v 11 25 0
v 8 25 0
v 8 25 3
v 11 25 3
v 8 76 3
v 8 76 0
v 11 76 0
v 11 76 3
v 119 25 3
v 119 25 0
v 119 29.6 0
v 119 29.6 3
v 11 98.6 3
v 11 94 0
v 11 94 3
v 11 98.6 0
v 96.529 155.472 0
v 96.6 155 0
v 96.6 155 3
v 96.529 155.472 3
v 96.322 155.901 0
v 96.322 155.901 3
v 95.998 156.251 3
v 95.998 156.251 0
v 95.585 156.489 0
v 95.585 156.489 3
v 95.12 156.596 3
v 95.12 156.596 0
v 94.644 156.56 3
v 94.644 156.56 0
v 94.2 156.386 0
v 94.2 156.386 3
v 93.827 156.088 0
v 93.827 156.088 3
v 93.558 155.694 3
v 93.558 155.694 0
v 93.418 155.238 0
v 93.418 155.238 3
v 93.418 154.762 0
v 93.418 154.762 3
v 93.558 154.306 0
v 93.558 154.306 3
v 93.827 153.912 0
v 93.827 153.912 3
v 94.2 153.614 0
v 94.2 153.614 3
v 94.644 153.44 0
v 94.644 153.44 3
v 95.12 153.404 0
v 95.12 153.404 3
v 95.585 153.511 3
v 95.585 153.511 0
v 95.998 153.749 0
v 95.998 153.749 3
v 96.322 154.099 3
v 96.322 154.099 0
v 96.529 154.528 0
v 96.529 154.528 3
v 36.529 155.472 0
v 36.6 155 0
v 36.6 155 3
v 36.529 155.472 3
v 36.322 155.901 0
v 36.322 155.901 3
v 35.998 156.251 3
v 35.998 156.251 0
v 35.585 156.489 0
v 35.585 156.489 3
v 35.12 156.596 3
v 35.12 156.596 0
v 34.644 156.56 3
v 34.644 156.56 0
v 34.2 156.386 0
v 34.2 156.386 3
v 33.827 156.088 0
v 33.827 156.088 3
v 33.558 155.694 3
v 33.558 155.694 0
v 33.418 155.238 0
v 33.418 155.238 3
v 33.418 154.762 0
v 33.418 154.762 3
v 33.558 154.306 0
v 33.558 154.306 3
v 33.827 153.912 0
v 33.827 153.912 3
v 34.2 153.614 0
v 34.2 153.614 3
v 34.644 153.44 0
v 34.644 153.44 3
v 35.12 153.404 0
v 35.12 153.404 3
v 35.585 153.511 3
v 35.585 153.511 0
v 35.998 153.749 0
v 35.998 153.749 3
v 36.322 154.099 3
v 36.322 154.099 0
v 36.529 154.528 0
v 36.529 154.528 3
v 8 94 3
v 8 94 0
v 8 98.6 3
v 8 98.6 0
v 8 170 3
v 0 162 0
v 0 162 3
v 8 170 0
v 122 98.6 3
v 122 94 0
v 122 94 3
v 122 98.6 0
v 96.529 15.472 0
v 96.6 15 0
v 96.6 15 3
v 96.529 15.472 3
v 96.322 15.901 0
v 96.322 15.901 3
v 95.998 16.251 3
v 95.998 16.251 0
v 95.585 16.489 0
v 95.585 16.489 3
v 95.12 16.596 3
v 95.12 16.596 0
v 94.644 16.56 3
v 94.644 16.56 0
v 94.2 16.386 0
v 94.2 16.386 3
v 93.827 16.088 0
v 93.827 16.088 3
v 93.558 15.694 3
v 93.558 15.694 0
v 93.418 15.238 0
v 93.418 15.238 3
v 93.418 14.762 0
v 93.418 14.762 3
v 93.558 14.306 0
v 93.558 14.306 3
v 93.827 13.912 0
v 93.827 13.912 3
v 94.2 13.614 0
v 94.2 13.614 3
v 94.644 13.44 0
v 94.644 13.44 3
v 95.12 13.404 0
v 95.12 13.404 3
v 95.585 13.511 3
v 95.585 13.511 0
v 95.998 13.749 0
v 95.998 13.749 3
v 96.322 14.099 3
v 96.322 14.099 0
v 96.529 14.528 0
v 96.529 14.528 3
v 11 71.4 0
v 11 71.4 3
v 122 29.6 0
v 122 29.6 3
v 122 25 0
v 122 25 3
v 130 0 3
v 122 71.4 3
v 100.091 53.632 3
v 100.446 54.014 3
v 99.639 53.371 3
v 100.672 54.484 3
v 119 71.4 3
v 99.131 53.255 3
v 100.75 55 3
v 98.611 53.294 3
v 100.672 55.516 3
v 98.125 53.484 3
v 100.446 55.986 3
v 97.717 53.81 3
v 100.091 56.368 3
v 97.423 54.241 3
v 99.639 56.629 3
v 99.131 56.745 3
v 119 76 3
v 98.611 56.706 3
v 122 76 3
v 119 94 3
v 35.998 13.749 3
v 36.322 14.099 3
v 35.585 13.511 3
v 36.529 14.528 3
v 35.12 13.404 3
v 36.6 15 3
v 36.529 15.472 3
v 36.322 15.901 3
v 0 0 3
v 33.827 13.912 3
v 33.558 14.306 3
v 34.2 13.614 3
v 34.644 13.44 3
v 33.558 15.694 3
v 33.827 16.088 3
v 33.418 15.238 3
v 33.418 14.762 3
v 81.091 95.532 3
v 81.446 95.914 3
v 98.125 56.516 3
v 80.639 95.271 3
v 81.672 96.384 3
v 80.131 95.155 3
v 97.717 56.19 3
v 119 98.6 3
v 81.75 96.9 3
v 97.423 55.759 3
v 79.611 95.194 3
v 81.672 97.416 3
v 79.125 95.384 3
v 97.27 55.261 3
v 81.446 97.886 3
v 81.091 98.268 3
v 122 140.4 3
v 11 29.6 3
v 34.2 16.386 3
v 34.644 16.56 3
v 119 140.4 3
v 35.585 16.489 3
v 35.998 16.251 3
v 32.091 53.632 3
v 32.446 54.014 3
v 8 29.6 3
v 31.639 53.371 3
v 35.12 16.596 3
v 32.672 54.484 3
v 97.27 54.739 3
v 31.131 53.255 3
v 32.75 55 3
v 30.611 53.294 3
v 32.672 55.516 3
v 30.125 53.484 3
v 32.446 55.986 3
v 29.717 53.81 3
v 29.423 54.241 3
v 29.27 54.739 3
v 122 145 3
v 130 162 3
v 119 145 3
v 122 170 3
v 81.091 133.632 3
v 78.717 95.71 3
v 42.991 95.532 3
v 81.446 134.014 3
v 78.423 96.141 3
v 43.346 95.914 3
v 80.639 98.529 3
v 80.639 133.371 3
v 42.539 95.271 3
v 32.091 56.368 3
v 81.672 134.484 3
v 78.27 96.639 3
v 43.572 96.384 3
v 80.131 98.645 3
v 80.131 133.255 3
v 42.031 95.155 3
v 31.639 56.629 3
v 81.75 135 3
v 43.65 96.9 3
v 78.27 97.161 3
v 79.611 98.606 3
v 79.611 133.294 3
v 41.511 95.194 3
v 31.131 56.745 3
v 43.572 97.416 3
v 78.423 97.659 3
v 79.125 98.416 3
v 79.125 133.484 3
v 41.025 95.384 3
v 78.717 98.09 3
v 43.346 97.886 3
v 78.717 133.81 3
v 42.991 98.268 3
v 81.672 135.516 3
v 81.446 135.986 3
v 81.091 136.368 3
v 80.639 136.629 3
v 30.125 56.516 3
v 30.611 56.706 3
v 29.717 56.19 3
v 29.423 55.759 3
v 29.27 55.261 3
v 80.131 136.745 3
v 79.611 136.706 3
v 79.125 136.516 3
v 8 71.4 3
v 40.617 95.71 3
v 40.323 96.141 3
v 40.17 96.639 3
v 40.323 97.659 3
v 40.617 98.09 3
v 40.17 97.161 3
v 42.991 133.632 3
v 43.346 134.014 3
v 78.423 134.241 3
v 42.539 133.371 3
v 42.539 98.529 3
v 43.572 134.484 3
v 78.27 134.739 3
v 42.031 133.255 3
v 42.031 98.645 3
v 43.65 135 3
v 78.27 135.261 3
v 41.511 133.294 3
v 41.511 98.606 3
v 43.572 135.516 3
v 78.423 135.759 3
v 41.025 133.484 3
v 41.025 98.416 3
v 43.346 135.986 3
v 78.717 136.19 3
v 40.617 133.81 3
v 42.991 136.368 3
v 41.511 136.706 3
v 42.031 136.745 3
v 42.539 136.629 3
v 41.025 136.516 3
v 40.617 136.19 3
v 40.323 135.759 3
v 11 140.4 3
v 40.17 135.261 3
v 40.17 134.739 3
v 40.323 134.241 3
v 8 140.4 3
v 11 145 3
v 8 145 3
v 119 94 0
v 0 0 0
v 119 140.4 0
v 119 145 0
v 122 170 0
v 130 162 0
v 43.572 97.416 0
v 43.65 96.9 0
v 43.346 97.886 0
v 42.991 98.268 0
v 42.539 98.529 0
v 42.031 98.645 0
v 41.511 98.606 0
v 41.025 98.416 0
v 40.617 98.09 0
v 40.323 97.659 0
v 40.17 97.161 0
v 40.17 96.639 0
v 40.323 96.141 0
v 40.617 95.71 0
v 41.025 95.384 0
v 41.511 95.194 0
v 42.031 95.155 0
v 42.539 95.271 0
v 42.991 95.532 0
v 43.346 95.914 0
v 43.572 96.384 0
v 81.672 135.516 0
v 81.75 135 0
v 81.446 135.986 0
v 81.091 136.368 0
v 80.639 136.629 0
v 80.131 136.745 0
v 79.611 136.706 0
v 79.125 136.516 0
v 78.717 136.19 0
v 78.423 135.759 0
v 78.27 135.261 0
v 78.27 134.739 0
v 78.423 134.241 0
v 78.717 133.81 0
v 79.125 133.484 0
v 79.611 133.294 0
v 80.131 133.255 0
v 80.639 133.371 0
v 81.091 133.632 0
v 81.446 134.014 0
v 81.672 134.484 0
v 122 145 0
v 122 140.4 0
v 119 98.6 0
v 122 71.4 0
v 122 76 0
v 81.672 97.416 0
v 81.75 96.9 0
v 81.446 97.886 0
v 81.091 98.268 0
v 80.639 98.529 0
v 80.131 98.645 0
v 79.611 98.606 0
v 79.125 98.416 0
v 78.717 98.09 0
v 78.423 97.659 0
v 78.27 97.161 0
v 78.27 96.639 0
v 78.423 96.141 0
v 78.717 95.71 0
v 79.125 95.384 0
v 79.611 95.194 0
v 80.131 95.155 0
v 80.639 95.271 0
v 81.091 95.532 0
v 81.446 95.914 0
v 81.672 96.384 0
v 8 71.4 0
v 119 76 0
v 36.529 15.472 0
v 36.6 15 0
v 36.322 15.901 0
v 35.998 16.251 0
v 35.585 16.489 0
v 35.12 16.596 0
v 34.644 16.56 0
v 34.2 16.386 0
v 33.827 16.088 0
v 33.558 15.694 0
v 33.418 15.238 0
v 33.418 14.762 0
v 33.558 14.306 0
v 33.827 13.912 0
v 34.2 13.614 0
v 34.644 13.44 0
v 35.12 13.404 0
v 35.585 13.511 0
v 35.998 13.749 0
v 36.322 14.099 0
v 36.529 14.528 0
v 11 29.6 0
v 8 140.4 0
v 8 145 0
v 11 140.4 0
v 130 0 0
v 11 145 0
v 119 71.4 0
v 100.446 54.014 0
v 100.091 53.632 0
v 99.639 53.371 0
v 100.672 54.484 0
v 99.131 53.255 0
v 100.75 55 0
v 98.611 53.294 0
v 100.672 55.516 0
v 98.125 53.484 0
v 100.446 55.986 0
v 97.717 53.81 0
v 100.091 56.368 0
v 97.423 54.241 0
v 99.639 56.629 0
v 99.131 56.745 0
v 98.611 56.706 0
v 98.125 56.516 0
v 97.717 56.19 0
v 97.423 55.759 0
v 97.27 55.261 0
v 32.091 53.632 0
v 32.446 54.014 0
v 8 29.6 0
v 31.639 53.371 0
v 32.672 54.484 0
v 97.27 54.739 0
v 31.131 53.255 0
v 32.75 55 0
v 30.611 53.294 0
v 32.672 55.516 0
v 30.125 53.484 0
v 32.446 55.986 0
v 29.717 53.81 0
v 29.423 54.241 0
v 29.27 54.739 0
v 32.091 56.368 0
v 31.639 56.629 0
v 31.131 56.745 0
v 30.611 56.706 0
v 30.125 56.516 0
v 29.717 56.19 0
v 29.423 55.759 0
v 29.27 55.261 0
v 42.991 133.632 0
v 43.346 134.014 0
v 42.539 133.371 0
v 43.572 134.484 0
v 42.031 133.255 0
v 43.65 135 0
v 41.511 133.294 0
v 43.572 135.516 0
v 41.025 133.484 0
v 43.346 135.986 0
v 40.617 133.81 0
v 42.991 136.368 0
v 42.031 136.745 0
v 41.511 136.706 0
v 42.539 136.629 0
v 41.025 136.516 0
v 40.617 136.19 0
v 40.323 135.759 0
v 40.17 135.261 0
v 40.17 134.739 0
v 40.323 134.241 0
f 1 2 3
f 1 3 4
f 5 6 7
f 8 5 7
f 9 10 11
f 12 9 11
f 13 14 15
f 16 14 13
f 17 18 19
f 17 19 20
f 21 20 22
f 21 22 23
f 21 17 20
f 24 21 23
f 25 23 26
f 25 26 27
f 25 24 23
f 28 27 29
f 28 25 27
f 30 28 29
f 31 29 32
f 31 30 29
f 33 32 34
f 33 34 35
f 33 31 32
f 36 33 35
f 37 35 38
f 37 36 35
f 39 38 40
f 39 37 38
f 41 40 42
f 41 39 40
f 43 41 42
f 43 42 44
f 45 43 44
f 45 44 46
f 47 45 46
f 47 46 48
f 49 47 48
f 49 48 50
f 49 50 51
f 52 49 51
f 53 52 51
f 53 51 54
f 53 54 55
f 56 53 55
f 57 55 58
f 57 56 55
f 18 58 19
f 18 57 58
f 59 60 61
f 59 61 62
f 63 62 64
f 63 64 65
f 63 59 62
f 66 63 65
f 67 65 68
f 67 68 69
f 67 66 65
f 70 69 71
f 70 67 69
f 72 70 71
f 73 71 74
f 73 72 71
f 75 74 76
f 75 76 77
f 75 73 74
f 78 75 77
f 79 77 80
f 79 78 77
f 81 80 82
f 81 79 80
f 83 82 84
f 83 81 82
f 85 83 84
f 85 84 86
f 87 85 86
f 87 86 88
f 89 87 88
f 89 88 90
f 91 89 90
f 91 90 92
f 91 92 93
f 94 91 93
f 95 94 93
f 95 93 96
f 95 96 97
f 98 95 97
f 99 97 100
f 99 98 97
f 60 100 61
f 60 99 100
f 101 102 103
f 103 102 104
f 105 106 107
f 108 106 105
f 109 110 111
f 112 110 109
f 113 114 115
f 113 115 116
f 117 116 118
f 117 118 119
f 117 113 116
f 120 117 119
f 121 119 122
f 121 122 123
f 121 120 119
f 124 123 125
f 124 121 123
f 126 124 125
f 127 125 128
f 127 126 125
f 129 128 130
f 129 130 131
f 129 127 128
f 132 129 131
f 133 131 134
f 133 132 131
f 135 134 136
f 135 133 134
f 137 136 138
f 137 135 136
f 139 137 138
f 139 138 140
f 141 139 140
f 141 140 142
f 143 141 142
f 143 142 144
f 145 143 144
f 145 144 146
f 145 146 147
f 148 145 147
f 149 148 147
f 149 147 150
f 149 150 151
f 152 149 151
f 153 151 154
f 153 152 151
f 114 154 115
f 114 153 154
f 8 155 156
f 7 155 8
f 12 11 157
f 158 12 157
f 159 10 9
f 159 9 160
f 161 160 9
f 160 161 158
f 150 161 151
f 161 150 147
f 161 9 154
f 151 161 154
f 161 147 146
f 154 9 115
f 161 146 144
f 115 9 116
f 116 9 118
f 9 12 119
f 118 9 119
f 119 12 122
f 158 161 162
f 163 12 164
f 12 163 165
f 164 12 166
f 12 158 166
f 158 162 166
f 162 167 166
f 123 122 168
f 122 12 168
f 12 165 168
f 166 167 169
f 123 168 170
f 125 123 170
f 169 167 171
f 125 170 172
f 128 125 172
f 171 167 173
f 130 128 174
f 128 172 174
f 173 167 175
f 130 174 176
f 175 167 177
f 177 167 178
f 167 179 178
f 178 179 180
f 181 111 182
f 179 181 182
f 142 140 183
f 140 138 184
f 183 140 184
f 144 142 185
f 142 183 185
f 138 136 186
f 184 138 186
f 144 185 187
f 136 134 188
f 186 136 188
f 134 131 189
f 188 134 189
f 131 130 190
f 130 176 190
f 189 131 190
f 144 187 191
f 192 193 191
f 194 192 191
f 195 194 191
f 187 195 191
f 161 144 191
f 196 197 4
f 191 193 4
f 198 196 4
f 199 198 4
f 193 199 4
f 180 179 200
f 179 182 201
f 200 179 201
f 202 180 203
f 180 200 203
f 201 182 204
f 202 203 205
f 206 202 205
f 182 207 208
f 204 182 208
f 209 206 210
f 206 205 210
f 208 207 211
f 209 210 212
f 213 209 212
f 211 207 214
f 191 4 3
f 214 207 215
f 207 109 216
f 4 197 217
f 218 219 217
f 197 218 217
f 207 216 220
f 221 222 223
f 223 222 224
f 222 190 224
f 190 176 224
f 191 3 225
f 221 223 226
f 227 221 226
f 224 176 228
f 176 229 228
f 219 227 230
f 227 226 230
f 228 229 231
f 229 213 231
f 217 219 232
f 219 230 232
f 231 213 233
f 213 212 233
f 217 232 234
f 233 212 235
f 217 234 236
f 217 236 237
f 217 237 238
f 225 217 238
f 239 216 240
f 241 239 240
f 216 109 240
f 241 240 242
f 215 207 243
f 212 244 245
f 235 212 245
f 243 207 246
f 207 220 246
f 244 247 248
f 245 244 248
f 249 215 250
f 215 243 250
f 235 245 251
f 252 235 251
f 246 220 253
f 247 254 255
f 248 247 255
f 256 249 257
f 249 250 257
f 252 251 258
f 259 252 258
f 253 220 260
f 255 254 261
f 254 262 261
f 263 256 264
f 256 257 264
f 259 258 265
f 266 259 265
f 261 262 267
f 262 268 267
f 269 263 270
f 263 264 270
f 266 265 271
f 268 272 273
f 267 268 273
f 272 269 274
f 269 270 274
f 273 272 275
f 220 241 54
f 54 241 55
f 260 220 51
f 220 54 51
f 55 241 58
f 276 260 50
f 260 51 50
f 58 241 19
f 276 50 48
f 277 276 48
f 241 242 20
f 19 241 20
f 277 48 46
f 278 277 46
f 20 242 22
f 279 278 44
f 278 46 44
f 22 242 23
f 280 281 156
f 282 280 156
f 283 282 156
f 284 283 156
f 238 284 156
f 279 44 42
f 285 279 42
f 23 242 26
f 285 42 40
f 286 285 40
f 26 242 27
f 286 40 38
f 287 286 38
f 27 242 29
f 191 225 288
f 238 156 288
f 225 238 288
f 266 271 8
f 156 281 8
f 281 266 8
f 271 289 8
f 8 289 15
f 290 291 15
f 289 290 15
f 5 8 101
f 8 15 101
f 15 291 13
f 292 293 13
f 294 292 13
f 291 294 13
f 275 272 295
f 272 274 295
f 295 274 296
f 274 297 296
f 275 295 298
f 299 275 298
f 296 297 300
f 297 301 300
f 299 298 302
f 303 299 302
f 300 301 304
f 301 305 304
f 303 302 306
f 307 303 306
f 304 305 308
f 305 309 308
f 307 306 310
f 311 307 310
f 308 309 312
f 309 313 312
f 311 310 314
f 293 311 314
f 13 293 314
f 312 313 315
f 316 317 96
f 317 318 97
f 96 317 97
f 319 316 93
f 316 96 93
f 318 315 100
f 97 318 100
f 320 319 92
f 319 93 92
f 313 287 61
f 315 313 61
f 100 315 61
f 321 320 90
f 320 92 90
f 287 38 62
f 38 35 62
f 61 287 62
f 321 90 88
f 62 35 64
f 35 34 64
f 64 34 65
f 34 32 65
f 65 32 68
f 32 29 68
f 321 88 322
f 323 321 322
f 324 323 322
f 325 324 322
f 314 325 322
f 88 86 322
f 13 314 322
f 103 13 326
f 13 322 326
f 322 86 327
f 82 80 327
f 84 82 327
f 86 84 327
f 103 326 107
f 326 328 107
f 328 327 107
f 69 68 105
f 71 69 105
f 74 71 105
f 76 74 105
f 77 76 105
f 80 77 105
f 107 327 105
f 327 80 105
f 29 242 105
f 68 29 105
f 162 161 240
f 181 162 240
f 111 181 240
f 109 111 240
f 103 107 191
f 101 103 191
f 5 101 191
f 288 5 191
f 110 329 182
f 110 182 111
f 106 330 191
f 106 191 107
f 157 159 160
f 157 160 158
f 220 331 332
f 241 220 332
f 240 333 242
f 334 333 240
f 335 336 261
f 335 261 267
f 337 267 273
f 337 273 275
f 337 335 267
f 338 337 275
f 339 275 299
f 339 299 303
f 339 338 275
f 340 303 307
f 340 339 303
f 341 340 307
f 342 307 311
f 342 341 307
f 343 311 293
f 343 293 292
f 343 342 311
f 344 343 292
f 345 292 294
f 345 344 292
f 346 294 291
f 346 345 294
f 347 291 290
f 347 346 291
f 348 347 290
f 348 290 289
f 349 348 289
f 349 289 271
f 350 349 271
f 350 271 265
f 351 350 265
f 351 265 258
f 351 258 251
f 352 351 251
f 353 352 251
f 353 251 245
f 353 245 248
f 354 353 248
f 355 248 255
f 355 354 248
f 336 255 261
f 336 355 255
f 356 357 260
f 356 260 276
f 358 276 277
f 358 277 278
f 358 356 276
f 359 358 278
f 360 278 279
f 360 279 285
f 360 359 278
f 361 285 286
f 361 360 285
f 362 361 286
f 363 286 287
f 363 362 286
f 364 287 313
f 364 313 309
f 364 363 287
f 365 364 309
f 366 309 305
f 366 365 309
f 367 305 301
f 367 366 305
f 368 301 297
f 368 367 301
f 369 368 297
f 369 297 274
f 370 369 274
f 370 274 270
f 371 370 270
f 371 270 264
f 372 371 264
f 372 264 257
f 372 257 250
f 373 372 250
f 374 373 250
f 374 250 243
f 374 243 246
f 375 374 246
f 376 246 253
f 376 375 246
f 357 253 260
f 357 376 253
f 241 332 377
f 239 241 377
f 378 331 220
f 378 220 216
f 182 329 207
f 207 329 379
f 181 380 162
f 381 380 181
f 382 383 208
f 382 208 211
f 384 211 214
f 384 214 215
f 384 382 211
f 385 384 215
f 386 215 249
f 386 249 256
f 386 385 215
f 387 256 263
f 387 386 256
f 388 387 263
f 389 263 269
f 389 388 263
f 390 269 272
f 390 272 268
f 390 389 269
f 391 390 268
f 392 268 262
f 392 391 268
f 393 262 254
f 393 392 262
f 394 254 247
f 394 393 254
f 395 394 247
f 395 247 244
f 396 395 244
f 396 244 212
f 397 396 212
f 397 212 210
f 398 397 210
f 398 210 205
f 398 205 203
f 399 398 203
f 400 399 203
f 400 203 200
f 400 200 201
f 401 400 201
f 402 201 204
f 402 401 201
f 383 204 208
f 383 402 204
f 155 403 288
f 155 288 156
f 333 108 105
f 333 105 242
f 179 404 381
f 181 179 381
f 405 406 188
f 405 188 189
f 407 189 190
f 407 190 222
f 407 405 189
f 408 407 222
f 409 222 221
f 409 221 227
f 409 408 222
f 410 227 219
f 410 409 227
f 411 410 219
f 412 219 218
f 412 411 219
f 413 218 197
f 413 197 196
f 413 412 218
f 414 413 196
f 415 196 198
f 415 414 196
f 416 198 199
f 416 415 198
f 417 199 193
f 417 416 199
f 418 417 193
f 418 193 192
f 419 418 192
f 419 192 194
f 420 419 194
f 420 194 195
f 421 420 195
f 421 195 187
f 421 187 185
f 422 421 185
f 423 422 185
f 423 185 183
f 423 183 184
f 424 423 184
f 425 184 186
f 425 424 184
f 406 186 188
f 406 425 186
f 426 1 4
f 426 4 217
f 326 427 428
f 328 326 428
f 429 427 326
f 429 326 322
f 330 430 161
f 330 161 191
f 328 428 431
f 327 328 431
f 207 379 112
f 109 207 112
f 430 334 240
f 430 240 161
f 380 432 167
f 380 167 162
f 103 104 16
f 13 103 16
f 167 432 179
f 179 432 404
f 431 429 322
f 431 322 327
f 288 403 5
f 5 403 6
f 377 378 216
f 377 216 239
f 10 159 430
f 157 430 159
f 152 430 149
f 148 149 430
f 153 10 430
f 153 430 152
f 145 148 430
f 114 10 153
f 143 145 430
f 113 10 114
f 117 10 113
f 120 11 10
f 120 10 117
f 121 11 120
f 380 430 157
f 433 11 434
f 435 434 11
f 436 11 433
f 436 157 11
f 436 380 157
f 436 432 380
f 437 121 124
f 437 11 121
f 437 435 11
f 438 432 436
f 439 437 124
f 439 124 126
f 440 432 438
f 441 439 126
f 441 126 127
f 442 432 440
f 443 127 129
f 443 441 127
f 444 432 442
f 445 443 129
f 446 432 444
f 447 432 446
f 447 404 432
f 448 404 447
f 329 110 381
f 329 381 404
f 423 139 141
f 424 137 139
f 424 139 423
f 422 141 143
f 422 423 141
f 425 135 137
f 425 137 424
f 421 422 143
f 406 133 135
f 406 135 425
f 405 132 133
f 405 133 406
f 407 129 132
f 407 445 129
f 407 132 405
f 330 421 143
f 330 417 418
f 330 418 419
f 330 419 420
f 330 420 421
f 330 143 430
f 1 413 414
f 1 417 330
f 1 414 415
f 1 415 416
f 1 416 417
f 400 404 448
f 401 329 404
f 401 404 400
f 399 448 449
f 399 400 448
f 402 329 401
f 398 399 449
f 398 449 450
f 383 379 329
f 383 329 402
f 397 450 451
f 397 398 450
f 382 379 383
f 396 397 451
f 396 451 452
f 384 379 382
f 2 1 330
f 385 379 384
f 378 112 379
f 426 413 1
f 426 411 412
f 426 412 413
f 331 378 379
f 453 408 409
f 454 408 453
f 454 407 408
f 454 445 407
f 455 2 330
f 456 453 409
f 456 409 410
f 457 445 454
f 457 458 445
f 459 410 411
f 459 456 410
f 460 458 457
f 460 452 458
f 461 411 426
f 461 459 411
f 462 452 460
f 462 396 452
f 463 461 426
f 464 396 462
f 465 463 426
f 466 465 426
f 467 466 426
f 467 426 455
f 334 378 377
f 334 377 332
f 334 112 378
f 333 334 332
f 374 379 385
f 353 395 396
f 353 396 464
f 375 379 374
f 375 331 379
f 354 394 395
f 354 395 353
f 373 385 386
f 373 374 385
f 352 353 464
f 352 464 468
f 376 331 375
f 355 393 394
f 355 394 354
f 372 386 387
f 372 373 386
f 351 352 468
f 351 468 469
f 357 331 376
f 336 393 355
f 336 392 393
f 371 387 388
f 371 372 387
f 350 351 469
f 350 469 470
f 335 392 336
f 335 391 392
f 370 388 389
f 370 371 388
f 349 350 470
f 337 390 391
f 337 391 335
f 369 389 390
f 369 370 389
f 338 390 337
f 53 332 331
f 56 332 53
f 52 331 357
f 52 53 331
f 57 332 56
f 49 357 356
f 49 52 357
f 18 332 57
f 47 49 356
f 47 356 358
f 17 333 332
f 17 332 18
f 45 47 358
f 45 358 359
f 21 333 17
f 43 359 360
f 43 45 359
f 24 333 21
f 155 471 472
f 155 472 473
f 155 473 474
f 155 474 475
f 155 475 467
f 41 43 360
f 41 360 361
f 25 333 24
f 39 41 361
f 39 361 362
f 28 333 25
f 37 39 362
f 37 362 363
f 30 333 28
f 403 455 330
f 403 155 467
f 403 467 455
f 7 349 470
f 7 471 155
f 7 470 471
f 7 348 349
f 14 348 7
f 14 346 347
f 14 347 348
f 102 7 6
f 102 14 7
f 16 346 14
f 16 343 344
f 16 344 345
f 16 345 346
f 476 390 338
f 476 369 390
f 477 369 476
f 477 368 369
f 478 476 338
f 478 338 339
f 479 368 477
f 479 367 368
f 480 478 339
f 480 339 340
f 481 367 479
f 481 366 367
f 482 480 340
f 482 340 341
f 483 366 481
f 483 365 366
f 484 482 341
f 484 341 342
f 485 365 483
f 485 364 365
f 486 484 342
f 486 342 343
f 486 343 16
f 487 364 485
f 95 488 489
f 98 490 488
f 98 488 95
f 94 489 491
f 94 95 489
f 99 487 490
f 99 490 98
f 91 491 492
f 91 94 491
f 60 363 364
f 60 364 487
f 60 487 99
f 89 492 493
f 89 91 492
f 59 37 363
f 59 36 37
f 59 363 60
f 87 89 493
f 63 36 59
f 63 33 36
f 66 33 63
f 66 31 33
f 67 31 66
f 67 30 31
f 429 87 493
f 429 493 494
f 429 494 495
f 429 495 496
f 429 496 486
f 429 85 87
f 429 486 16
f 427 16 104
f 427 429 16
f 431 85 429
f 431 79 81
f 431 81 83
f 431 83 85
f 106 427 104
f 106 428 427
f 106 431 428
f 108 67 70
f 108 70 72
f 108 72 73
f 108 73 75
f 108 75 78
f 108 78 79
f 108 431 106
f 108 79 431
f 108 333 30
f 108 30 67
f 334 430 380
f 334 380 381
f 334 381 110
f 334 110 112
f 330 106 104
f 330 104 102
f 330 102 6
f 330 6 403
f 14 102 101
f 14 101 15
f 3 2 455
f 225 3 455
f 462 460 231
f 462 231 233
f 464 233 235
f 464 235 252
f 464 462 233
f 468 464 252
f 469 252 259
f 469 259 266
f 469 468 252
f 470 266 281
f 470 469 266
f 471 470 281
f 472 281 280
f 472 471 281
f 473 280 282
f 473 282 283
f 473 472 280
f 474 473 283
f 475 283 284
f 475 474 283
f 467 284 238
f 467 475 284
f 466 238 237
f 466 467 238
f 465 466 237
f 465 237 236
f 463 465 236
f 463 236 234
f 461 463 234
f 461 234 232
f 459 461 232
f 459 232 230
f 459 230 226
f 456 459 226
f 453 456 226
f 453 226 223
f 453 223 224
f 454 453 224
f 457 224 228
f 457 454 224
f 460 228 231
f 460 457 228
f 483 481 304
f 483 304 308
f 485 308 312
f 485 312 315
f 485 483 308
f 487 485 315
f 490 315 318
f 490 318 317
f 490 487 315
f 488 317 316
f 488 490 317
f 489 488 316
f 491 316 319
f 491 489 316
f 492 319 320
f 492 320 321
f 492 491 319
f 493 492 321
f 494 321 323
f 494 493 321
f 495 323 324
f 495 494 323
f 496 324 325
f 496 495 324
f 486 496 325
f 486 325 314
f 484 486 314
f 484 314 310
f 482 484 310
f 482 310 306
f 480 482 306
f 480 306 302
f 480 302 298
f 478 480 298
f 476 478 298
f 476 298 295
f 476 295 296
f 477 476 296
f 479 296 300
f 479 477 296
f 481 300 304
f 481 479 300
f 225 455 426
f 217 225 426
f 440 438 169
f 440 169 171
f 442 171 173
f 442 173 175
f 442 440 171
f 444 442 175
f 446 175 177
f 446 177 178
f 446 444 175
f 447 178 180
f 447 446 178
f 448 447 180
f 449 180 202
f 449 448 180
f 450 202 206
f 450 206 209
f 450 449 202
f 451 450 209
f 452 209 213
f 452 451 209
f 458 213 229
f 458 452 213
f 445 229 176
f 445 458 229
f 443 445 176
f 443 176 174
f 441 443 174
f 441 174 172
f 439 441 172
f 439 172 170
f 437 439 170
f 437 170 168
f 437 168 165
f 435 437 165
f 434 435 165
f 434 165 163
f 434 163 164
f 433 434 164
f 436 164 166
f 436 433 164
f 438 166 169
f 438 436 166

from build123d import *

# Parameters (mm, degrees)
SKETCH_1_R      = 1.6
SKETCH_1_R_2    = 1.75
SKETCH_1_W      = 3
SKETCH_1_H      = 4.6
EXTRUDE_1_DEPTH = 3


with BuildPart() as part:
    # ｽｹｯﾁ1 → ﾎﾞｽ - 押し出し1 (new body)
    with BuildSketch(Plane.XY):
        Polygon((0, 162), (8, 170), (122, 170), (130, 162), (130, 0), (0, 0), align=None)
        with Locations((35, 155)):
            Circle(SKETCH_1_R, mode=Mode.SUBTRACT)
        with Locations((95, 155)):
            Circle(SKETCH_1_R, mode=Mode.SUBTRACT)
        with Locations((35, 15)):
            Circle(SKETCH_1_R, mode=Mode.SUBTRACT)
        with Locations((95, 15)):
            Circle(SKETCH_1_R, mode=Mode.SUBTRACT)
        with Locations((41.9, 135)):
            Circle(SKETCH_1_R_2, mode=Mode.SUBTRACT)
        with Locations((80, 135)):
            Circle(SKETCH_1_R_2, mode=Mode.SUBTRACT)
        with Locations((41.9, 96.9)):
            Circle(SKETCH_1_R_2, mode=Mode.SUBTRACT)
        with Locations((80, 96.9)):
            Circle(SKETCH_1_R_2, mode=Mode.SUBTRACT)
        with Locations((31, 55)):
            Circle(SKETCH_1_R_2, mode=Mode.SUBTRACT)
        with Locations((99, 55)):
            Circle(SKETCH_1_R_2, mode=Mode.SUBTRACT)
        with Locations((9.5, 142.7)):
            Rectangle(SKETCH_1_W, SKETCH_1_H, mode=Mode.SUBTRACT)
        with Locations((120.5, 142.7)):
            Rectangle(SKETCH_1_W, SKETCH_1_H, mode=Mode.SUBTRACT)
        with Locations((9.5, 27.3)):
            Rectangle(SKETCH_1_W, SKETCH_1_H, mode=Mode.SUBTRACT)
        with Locations((120.5, 27.3)):
            Rectangle(SKETCH_1_W, SKETCH_1_H, mode=Mode.SUBTRACT)
        with Locations((9.5, 96.3)):
            Rectangle(SKETCH_1_W, SKETCH_1_H, mode=Mode.SUBTRACT)
        with Locations((120.5, 96.3)):
            Rectangle(SKETCH_1_W, SKETCH_1_H, mode=Mode.SUBTRACT)
        with Locations((9.5, 73.7)):
            Rectangle(SKETCH_1_W, SKETCH_1_H, mode=Mode.SUBTRACT)
        with Locations((120.5, 73.7)):
            Rectangle(SKETCH_1_W, SKETCH_1_H, mode=Mode.SUBTRACT)
    extrude(amount=EXTRUDE_1_DEPTH)


solid = part.part
